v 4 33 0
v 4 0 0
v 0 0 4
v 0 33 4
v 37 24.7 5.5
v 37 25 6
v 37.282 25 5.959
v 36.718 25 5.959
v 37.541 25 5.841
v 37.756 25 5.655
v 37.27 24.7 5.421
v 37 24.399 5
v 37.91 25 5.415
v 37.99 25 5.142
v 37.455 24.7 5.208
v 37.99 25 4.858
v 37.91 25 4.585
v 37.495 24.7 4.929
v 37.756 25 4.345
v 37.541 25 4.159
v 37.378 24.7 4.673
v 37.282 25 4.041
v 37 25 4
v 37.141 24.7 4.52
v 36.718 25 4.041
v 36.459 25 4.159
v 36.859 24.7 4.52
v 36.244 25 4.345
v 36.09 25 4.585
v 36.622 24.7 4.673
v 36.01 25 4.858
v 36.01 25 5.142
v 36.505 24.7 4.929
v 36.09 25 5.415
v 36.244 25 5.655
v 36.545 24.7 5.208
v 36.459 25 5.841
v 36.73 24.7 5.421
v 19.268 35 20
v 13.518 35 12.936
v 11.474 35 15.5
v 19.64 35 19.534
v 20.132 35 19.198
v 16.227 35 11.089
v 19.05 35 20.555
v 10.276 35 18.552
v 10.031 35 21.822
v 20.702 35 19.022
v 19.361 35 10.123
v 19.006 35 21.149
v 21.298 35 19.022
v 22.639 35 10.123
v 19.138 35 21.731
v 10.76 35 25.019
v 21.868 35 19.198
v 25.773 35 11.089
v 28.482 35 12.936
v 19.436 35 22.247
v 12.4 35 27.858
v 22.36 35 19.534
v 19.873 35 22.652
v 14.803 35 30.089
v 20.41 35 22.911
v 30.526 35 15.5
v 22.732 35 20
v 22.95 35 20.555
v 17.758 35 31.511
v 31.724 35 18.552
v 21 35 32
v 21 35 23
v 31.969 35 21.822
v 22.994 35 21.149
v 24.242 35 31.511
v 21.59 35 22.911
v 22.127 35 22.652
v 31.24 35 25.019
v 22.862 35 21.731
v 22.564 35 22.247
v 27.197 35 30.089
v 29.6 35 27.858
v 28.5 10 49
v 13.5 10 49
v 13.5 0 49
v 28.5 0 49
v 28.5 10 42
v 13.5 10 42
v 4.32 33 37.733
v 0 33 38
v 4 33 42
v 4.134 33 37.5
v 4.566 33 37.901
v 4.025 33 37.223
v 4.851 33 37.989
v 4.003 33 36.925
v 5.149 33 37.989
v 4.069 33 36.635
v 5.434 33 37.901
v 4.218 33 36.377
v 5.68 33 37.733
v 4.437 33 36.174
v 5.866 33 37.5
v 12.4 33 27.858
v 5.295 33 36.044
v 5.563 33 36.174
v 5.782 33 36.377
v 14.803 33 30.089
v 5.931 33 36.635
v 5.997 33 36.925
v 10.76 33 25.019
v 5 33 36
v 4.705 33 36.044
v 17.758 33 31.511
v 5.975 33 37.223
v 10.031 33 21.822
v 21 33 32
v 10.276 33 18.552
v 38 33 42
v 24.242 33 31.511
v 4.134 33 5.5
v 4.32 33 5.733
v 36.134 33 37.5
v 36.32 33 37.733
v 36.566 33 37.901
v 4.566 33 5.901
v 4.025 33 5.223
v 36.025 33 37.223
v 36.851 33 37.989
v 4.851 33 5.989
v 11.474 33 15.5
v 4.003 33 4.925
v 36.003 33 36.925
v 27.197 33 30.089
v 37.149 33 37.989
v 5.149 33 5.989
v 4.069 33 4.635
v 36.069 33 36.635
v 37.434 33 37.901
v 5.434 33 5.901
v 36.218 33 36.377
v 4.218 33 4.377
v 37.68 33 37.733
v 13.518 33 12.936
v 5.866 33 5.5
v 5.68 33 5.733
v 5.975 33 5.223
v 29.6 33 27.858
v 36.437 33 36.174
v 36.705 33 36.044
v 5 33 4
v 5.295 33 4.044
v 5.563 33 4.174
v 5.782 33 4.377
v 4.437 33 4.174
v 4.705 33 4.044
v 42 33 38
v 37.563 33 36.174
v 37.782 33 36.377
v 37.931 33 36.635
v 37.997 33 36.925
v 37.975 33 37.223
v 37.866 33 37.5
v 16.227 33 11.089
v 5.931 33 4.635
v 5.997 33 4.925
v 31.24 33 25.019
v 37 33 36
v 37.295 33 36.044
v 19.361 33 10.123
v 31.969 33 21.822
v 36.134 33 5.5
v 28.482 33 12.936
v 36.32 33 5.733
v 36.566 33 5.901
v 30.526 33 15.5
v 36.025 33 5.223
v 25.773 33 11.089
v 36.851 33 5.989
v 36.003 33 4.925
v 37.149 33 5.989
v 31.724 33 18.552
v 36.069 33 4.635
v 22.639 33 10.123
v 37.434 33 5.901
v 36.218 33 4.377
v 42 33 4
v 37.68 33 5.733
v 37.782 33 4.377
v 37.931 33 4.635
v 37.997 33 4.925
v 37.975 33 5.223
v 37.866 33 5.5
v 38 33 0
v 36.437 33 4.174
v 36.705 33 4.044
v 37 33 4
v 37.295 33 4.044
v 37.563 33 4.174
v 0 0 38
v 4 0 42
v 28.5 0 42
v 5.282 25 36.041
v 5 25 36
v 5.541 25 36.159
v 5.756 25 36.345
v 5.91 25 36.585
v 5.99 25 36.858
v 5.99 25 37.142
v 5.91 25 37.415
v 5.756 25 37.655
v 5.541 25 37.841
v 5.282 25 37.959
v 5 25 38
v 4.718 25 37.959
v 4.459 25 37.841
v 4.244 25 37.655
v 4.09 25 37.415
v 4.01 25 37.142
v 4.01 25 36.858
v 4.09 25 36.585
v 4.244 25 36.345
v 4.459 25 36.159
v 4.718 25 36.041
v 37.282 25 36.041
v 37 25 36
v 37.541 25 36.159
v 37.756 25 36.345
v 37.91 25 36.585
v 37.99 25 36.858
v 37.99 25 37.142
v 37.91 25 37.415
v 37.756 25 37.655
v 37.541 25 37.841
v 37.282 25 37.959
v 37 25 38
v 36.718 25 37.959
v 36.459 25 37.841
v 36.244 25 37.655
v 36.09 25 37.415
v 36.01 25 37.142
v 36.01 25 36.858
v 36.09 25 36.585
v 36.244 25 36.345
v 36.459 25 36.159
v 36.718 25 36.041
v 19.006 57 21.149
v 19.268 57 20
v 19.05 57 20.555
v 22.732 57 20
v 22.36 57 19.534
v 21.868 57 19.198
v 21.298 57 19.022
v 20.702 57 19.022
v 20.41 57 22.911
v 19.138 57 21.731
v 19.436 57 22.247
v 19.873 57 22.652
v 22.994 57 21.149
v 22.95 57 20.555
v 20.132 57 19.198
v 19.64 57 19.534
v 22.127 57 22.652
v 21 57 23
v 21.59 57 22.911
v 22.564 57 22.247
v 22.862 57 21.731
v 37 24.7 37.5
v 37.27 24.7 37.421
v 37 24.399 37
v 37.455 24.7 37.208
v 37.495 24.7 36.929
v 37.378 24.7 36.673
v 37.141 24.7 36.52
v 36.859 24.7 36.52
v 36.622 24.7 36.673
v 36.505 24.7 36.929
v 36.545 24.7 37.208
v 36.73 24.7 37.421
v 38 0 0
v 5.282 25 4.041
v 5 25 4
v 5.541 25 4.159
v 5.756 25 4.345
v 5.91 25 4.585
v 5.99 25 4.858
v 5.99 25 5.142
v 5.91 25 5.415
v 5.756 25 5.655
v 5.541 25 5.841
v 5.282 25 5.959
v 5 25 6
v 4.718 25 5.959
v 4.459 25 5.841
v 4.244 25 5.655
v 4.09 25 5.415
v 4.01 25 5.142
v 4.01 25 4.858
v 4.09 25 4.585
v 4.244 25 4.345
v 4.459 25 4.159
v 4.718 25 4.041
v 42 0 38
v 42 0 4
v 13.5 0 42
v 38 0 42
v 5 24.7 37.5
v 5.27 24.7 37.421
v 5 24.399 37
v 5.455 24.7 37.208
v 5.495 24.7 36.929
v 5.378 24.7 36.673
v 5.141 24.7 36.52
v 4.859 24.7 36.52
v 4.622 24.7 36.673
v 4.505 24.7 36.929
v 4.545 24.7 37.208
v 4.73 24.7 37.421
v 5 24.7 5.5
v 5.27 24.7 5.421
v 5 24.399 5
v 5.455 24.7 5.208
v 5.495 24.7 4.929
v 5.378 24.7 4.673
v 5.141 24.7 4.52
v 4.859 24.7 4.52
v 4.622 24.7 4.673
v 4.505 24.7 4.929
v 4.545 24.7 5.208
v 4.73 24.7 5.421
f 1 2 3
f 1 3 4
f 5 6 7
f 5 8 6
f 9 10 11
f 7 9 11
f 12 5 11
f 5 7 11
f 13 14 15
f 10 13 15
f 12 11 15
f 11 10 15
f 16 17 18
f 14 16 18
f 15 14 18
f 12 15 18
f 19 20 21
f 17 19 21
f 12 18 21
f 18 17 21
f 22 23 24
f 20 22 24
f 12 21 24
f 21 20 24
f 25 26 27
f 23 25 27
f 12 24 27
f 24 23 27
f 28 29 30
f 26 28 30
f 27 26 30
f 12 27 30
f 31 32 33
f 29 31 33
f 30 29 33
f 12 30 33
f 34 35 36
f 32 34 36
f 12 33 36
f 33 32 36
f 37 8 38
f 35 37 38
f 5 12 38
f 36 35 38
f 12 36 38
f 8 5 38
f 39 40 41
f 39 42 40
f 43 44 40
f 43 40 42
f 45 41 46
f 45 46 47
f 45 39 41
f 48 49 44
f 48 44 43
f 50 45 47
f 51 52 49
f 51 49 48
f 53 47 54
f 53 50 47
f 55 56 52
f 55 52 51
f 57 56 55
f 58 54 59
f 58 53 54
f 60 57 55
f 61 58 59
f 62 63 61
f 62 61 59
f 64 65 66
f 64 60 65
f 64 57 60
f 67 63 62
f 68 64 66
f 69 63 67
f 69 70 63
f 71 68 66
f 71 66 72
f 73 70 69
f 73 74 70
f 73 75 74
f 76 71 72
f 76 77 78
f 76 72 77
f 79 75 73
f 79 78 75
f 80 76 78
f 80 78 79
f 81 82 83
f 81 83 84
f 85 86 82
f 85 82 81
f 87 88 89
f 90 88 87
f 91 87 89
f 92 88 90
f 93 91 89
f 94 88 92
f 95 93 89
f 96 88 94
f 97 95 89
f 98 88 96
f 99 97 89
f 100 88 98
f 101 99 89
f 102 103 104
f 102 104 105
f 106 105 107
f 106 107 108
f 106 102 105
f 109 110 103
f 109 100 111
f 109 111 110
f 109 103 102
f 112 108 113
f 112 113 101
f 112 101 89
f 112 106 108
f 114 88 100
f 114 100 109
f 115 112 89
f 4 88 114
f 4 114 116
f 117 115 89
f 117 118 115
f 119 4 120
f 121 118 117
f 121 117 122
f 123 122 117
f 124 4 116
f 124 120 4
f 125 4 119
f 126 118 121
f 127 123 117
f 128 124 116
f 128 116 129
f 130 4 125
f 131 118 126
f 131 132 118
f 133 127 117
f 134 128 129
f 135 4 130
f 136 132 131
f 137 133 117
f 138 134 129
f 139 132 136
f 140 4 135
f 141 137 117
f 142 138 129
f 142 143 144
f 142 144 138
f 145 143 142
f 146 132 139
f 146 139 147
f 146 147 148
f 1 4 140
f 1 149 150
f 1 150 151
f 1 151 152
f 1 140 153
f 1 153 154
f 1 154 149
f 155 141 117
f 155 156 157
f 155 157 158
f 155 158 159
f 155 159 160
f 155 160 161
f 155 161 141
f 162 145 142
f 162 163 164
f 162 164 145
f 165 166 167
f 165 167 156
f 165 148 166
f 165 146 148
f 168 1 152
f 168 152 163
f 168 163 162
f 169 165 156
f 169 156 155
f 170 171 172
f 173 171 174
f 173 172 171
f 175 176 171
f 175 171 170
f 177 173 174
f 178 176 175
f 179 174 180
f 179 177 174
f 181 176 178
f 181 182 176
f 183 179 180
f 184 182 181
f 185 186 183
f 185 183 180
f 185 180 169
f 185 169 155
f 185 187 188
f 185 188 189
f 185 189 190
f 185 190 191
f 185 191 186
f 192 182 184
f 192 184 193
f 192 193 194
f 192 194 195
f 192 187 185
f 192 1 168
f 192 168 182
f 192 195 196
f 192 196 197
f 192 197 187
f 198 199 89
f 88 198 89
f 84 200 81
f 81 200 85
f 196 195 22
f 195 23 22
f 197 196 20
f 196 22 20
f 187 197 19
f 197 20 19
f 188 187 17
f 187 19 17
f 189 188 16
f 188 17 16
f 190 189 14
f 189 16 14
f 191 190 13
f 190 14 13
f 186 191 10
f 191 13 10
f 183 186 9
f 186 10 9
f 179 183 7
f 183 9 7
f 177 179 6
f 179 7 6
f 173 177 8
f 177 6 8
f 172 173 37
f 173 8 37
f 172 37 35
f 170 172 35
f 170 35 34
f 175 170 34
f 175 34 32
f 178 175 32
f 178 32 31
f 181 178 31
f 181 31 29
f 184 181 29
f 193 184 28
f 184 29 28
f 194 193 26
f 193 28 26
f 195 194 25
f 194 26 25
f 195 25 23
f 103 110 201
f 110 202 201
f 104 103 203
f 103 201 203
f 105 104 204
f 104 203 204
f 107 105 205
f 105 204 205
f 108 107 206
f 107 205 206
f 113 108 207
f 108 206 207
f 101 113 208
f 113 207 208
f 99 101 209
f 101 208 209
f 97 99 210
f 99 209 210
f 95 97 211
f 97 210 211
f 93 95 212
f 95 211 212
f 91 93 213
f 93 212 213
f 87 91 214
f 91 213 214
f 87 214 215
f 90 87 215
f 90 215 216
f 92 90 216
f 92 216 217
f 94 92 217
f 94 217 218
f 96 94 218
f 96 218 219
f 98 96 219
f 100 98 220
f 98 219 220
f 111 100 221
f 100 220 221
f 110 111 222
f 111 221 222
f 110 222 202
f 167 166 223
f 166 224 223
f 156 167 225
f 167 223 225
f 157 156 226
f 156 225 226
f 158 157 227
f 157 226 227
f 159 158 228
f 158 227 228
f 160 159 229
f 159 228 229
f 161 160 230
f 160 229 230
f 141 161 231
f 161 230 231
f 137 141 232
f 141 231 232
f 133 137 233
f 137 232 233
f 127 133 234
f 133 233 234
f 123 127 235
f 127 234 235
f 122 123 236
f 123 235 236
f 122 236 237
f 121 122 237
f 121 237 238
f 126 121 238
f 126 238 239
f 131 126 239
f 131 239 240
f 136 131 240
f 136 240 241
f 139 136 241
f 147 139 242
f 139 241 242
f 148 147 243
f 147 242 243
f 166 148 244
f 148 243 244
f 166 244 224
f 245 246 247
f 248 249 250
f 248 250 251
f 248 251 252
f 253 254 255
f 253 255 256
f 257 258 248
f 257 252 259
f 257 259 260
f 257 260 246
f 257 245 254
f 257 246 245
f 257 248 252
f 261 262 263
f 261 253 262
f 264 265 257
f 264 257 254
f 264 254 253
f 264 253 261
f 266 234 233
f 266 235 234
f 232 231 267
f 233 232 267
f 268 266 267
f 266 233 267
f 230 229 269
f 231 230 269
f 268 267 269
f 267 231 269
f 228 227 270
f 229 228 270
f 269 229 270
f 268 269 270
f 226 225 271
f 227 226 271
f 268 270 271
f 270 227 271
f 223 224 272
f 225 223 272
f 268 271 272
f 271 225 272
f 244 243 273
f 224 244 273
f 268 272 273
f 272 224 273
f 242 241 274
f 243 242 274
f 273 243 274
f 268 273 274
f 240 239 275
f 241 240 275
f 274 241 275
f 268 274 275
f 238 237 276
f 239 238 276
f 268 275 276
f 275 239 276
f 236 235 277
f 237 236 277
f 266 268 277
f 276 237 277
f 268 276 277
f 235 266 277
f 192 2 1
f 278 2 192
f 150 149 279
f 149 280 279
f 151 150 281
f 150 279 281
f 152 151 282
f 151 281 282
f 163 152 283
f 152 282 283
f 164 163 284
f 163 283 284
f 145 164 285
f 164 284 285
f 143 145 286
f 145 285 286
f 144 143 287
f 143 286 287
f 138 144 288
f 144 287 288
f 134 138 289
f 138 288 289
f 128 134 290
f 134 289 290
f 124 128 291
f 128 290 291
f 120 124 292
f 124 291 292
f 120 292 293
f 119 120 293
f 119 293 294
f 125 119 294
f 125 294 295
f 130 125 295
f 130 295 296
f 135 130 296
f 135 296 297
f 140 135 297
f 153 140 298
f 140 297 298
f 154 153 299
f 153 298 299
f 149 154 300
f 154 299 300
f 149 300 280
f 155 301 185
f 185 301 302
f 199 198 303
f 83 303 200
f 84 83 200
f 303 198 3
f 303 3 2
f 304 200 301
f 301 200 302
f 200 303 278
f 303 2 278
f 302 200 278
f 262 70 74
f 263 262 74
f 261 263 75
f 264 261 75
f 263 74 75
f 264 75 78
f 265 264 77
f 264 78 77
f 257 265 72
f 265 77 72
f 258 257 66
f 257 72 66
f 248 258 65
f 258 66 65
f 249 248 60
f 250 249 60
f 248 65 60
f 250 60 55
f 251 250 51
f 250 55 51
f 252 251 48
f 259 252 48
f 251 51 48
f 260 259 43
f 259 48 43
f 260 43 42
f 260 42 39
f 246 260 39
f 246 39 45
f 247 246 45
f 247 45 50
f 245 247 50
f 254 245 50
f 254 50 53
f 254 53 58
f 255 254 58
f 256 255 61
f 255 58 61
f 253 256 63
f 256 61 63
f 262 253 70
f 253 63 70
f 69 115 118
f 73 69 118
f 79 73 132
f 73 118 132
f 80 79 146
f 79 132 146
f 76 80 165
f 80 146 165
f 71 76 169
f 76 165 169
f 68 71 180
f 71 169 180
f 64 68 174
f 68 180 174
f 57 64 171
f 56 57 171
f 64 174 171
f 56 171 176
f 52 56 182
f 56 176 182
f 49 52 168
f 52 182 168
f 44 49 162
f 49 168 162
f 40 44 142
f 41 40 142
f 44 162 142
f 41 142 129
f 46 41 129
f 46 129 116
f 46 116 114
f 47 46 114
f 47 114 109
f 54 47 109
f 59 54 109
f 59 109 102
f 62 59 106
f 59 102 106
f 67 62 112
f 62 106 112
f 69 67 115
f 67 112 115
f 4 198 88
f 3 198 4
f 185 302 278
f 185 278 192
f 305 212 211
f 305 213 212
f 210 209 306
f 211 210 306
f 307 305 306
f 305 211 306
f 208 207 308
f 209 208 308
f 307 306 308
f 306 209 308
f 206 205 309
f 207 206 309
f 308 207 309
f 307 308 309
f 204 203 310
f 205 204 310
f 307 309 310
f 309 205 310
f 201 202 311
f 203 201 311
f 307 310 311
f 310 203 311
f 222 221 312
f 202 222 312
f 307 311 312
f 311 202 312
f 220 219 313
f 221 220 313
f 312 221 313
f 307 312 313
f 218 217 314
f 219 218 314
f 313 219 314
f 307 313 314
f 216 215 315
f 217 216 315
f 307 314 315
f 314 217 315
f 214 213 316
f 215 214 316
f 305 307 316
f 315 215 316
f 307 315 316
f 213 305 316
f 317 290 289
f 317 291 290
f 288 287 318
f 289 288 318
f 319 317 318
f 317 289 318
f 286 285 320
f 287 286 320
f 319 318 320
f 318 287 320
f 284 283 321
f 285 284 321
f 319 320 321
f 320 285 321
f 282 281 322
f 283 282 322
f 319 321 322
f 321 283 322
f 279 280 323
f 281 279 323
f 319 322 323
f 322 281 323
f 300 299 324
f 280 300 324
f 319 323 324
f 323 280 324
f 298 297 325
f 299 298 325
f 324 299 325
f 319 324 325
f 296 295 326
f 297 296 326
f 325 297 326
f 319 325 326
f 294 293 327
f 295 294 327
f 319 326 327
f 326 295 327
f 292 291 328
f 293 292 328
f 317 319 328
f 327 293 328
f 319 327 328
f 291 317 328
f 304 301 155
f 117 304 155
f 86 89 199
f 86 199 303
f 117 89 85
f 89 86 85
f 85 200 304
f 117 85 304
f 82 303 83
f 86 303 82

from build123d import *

# Parameters (mm, degrees)
SKETCH1_W                           = 42
SKETCH1_H                           = 42
BOSS_EXTRUDE1_DEPTH                 = 33
SKETCH2_R                           = 11
BOSS_EXTRUDE2_DEPTH                 = 2
SKETCH3_R                           = 2
BOSS_EXTRUDE3_DEPTH                 = 22
SKETCH4_W                           = 15
SKETCH4_H                           = 10
BOSS_EXTRUDE4_DEPTH                 = 7
F_2_0MM_CLEARANCE_DOWEL_HOLE1_D     = 2
F_2_0MM_CLEARANCE_DOWEL_HOLE1_DEPTH = 8
F_2_0MM_CLEARANCE_DOWEL_HOLE1_TIP   = 0.600860619
CHAMFER1_SIZE                       = 4


with BuildPart() as part:
    # Sketch1 → Boss-Extrude1 (new body)
    with BuildSketch(Plane(origin=(0, 0, 0), x_dir=(1, 0, 0), z_dir=(0, 1, 0))):
        with Locations((21, -21)):
            Rectangle(SKETCH1_W, SKETCH1_H)
    extrude(amount=BOSS_EXTRUDE1_DEPTH)

    # Sketch2 → Boss-Extrude2 (add)
    with BuildSketch(Plane(origin=(0, 33, 0), x_dir=(1, 0, 0), z_dir=(0, 1, 0))):
        with Locations(Location((21, -21, 0), (0, 0, 270))):
            Circle(SKETCH2_R)
    extrude(amount=BOSS_EXTRUDE2_DEPTH)

    # Sketch3 → Boss-Extrude3 (add)
    with BuildSketch(Plane(origin=(0, 35, 0), x_dir=(1, 0, 0), z_dir=(0, 1, 0))):
        with Locations(Location((21, -21, 0), (0, 0, 270))):
            Circle(SKETCH3_R)
    extrude(amount=BOSS_EXTRUDE3_DEPTH)

    # Sketch4 → Boss-Extrude4 (add)
    with BuildSketch(Plane.XY.offset(42)):
        with Locations((21, 5)):
            Rectangle(SKETCH4_W, SKETCH4_H)
    extrude(amount=BOSS_EXTRUDE4_DEPTH)

    # Ø2.0mm Clearance Dowel Hole1
    with Locations(Plane(origin=(37, 33, 5), x_dir=(0, 0, 1), z_dir=(0, 1, 0))):
        with Locations((0, 0), (32, 0), (32, -32), (0, -32)):
            Hole(F_2_0MM_CLEARANCE_DOWEL_HOLE1_D / 2, depth=F_2_0MM_CLEARANCE_DOWEL_HOLE1_DEPTH)
            with Locations((0, 0, -(F_2_0MM_CLEARANCE_DOWEL_HOLE1_DEPTH + F_2_0MM_CLEARANCE_DOWEL_HOLE1_TIP / 2))):  # 118° drill point
                Cone(0, F_2_0MM_CLEARANCE_DOWEL_HOLE1_D / 2, F_2_0MM_CLEARANCE_DOWEL_HOLE1_TIP, mode=Mode.SUBTRACT)

    # Chamfer1
    chamfer1_edges = [part.edges().sort_by_distance(p)[0] for p in [
        (0, 16.5, 0),
        (42, 16.5, 0),
        (42, 16.5, 42),
        (0, 16.5, 42),
    ]]
    chamfer(chamfer1_edges, length=CHAMFER1_SIZE)


solid = part.part
